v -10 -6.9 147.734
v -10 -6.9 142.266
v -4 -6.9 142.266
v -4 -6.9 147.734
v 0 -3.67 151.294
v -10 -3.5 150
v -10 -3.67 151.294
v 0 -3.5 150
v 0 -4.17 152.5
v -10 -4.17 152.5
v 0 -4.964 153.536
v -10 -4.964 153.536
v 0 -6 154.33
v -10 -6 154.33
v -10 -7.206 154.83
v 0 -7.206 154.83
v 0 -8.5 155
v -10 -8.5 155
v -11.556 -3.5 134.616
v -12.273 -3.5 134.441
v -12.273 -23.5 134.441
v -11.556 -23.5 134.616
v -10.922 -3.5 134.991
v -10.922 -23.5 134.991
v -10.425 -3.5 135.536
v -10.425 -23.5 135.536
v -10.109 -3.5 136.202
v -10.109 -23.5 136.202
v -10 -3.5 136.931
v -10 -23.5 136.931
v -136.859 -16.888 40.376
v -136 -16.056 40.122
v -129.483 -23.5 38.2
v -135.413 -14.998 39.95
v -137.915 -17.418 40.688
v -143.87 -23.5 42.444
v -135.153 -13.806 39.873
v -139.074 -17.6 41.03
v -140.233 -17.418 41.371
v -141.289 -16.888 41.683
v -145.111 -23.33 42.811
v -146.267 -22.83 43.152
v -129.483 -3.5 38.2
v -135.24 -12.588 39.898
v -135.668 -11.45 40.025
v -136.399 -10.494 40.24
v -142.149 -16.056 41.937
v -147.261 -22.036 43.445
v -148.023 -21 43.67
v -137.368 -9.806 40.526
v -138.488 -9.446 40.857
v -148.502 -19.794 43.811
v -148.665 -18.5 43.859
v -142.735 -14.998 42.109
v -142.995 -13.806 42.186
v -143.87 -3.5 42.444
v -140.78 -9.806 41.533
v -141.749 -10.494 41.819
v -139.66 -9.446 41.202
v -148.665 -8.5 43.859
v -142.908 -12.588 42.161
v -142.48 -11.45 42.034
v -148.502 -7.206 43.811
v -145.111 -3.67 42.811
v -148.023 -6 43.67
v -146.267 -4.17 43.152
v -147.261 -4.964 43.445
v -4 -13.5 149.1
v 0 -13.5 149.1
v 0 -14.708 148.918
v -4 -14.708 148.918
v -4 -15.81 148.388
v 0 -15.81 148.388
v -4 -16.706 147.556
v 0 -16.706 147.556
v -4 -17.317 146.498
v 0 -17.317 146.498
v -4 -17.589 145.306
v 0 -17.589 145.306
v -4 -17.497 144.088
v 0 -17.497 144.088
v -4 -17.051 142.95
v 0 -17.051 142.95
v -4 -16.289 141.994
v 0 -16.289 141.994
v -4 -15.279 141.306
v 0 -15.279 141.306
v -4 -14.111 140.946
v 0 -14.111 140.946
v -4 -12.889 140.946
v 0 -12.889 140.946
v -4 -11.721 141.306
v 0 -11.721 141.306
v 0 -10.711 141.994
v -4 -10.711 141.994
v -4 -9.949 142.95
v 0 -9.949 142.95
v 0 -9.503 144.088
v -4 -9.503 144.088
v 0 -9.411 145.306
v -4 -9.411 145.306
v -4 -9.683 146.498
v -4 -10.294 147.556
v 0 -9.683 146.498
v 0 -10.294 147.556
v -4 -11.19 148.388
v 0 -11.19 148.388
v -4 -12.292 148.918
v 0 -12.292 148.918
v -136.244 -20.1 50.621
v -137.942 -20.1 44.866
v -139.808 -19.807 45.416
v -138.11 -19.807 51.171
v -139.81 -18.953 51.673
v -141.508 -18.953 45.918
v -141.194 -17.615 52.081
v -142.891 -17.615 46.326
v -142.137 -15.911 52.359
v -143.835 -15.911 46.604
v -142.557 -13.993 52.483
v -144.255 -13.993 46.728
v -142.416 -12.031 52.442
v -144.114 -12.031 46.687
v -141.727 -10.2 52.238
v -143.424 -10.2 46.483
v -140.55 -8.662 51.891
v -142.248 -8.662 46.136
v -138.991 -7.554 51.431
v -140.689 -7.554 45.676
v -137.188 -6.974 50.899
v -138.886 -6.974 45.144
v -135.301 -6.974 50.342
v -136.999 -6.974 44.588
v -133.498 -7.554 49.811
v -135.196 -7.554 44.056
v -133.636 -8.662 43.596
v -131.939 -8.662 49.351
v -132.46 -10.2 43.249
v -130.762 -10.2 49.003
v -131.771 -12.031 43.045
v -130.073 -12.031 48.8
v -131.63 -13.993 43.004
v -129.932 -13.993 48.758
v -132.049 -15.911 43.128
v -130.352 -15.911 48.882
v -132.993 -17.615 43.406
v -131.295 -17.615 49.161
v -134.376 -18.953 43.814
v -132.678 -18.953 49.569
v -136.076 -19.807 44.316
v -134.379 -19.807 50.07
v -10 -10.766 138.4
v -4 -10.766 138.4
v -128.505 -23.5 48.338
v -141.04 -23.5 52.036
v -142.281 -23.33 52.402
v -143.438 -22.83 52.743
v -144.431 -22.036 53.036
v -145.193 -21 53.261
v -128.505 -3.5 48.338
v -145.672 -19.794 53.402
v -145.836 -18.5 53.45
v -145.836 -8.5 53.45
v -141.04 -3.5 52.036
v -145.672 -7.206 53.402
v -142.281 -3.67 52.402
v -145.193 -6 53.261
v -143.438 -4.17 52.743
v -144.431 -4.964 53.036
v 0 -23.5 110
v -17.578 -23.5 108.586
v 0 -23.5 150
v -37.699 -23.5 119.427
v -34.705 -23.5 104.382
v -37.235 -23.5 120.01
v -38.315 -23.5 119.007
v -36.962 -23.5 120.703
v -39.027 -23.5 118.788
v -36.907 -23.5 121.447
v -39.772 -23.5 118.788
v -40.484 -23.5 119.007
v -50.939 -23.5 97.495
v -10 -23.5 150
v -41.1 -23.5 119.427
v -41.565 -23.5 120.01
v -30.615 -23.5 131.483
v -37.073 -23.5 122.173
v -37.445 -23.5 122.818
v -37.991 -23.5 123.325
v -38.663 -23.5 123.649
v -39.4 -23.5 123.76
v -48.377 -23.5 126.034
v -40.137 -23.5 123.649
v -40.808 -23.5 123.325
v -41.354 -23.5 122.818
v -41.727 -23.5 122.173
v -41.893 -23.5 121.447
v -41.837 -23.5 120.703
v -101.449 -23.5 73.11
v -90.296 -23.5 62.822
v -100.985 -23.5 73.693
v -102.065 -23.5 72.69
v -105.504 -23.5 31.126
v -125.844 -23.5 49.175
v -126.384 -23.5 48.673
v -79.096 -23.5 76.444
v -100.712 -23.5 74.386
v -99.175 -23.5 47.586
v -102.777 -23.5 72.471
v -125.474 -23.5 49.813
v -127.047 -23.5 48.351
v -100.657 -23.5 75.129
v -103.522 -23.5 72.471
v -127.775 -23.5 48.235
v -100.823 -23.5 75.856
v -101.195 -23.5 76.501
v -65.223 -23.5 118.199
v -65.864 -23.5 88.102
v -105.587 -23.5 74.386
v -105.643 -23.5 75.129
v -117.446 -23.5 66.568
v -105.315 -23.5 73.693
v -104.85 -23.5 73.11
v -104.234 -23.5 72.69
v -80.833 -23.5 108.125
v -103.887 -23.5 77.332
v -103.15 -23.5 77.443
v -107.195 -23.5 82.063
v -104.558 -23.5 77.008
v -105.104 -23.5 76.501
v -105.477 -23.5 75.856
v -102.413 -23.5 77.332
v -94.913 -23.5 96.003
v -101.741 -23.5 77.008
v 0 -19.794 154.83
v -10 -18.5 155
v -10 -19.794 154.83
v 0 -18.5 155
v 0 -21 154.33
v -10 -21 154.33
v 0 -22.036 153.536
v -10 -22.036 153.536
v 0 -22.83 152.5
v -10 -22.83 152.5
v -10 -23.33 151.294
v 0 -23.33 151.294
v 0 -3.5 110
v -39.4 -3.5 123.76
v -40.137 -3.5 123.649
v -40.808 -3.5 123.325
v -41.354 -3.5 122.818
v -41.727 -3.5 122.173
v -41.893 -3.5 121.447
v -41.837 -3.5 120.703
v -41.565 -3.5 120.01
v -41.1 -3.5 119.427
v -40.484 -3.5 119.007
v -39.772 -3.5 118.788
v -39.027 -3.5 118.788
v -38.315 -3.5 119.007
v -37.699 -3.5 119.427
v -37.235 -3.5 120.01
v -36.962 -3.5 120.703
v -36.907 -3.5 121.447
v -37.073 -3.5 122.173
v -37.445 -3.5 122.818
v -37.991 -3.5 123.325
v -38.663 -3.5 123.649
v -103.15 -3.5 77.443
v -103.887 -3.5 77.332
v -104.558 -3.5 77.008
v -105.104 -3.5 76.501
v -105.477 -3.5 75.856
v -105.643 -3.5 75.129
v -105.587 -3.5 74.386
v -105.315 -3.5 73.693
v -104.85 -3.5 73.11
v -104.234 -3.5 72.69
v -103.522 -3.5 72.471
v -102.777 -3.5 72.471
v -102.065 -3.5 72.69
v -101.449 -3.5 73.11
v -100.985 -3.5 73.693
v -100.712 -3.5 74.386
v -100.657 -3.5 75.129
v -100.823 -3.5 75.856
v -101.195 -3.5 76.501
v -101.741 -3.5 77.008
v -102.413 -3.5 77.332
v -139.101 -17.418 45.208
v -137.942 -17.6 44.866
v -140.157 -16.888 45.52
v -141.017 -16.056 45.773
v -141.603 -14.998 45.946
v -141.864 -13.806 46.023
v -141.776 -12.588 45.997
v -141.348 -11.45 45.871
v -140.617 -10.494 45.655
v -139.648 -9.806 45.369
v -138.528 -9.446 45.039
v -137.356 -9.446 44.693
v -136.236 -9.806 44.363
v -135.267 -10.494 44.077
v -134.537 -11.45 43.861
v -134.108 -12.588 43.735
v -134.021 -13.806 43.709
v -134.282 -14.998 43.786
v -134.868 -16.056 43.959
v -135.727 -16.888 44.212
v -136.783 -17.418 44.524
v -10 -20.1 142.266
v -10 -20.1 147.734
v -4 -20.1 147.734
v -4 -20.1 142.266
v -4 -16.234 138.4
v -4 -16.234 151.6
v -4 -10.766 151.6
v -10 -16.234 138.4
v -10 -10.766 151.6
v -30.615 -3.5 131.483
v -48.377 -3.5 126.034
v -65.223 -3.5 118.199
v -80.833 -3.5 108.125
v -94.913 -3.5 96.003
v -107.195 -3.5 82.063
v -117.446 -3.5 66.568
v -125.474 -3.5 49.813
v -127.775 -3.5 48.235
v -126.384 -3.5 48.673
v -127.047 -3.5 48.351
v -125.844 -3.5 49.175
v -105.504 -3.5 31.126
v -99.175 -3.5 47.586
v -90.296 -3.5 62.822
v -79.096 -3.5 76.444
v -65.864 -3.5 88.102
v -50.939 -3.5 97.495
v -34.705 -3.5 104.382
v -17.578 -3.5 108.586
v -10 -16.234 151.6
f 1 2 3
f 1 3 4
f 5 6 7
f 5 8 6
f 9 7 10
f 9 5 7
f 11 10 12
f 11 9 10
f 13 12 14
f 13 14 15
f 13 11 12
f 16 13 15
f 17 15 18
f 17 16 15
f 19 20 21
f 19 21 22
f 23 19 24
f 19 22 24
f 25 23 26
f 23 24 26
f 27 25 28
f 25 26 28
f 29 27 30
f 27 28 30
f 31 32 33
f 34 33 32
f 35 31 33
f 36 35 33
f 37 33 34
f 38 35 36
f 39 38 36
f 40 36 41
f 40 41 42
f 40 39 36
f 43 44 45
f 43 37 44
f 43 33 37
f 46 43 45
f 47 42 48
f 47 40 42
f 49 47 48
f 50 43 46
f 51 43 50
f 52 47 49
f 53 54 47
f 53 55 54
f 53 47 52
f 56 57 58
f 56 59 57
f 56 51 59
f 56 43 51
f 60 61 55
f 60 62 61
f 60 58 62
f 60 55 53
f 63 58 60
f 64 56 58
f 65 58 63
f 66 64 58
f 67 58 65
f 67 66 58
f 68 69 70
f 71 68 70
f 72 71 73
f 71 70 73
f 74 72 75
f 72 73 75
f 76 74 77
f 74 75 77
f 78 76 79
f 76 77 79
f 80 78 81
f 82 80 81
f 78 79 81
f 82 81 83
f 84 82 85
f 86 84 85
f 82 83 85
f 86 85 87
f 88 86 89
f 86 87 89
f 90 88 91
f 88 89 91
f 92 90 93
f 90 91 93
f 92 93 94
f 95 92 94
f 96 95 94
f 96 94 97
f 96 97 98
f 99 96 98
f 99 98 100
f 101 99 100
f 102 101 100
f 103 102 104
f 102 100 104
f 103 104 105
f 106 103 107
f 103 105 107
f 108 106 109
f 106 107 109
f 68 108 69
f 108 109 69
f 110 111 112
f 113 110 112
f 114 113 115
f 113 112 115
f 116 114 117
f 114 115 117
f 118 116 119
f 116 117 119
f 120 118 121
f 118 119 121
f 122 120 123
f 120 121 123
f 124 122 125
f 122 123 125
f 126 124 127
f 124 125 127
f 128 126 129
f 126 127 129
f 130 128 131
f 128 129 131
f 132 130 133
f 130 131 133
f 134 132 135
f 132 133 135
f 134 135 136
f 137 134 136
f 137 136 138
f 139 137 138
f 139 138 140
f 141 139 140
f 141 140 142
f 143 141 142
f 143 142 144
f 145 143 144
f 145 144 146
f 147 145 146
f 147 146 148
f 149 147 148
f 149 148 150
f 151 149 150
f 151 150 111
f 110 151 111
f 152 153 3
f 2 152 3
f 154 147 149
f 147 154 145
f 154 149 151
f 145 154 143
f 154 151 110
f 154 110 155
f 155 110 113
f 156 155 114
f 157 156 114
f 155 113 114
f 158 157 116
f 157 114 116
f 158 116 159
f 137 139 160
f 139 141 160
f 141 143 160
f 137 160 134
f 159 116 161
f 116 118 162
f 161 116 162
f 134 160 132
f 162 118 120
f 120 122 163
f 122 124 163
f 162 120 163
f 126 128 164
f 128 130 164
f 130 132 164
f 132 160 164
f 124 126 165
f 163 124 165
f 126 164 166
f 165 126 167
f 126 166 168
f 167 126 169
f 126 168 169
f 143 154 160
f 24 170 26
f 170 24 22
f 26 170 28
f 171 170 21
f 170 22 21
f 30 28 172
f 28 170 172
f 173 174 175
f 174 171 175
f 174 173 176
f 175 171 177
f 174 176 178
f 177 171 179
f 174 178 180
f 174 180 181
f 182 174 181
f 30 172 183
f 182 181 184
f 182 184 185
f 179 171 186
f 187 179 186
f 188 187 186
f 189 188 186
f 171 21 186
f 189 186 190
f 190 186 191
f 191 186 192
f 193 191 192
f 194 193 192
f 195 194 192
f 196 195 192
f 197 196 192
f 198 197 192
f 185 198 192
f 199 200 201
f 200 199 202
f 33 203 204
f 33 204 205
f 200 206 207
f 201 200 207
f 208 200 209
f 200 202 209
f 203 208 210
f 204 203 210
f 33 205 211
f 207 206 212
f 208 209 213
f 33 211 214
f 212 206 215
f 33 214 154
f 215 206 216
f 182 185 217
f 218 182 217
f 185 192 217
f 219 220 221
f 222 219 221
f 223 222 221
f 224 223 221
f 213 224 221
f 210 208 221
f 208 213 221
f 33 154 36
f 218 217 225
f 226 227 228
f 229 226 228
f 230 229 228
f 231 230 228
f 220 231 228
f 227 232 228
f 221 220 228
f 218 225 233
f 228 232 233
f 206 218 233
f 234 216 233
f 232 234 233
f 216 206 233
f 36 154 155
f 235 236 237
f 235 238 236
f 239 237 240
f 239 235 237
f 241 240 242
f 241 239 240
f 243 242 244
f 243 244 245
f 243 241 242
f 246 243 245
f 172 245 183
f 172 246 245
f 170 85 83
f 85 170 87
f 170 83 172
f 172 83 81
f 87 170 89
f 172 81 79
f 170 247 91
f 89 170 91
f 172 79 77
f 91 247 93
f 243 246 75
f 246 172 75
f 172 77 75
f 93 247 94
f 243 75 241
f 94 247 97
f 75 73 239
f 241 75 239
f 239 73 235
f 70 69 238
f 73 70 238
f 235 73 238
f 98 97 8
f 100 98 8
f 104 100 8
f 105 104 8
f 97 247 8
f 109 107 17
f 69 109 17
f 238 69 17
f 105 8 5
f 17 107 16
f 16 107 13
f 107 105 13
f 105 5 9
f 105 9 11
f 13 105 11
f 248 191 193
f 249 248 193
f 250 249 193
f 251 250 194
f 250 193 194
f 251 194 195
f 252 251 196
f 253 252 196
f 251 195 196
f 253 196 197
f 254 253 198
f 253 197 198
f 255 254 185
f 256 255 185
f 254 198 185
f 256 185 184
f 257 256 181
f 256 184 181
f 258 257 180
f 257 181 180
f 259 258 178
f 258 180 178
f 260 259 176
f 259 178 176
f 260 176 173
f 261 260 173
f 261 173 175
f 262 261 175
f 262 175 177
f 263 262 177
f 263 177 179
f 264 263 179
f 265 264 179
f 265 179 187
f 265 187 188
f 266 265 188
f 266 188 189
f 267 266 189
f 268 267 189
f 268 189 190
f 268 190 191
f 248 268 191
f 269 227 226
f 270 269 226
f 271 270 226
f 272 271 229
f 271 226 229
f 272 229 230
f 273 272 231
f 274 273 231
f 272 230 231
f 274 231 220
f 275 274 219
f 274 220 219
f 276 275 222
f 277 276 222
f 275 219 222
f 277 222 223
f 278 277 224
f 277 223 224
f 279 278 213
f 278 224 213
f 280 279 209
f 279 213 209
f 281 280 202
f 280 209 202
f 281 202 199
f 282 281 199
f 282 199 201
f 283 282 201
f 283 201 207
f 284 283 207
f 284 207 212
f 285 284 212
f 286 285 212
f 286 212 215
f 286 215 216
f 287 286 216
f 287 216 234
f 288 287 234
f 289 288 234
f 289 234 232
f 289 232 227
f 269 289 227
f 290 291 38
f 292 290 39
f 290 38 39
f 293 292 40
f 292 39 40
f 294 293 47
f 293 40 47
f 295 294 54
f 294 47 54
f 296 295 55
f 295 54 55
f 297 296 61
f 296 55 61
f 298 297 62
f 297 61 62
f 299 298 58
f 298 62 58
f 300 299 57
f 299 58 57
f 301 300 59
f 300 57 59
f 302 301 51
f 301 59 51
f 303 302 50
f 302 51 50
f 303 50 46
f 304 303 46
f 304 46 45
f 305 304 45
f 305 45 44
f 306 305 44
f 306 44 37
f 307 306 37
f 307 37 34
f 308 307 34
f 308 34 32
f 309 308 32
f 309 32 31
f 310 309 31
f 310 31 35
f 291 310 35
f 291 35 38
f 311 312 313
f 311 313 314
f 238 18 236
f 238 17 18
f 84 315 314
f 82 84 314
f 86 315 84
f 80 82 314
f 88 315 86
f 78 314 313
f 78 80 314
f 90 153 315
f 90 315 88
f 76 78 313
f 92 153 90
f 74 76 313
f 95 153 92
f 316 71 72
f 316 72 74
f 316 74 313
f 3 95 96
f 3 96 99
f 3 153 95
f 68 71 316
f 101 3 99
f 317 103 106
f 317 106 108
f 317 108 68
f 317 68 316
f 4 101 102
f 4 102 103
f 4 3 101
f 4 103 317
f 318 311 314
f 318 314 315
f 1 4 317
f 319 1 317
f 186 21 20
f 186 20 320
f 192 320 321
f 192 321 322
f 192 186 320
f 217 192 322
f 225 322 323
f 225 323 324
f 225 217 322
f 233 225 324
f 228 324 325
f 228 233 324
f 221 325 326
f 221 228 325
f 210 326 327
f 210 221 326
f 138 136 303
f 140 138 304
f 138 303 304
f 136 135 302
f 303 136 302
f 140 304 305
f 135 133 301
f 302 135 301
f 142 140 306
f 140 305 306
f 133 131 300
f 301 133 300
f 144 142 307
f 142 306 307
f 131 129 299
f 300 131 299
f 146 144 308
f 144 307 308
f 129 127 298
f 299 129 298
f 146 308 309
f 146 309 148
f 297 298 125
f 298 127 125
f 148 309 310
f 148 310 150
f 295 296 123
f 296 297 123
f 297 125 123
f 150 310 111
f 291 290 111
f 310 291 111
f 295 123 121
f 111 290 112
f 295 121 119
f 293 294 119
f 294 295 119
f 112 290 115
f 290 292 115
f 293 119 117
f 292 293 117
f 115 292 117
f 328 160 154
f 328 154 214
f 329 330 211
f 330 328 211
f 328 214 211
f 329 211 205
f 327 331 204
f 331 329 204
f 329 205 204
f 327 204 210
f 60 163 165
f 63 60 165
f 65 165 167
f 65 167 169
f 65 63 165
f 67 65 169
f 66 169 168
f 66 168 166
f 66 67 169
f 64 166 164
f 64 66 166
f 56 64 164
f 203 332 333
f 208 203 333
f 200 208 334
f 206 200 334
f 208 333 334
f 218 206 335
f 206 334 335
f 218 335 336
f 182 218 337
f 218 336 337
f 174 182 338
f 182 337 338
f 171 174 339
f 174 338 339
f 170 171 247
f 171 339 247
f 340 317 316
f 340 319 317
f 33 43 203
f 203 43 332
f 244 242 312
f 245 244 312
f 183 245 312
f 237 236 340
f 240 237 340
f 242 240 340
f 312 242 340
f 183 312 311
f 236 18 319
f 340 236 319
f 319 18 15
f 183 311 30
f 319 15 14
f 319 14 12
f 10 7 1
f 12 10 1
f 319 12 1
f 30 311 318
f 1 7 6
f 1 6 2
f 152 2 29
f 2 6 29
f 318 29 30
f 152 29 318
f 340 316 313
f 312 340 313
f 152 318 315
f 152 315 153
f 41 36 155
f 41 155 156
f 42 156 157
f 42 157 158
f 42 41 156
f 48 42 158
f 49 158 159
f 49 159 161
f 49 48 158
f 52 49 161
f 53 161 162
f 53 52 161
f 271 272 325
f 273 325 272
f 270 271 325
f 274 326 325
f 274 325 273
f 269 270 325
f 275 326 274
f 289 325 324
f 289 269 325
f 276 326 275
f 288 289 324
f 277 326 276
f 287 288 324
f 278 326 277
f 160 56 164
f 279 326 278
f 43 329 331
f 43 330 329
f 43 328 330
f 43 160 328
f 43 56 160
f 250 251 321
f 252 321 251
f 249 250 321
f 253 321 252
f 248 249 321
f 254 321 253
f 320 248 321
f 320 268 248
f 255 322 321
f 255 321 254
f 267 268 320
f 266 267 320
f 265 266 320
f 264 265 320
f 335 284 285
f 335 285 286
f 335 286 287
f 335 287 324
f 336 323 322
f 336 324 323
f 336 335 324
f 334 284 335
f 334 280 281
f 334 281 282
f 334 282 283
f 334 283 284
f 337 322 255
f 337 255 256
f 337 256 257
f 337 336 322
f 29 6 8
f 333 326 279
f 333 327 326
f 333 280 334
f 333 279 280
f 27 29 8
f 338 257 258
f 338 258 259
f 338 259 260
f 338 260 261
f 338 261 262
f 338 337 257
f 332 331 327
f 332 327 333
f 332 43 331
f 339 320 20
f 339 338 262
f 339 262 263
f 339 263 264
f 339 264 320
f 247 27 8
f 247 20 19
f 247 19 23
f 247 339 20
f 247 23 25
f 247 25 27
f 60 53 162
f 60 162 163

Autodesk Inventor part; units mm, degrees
ref_plane "YZ Plane" through (0, 0, 0) normal (1, 0, 0) x (0, 1, 0)
ref_plane "XZ Plane" through (0, 0, 0) normal (0, 1, 0) x (-1, 0, 0)
ref_plane "XY Plane" through (0, 0, 0) normal (0, 0, 1) x (1, 0, 0)
sketch "Sketch1" plane through (0, 0, 0) normal (0, 1, 0) x (-1, 0, 0)
  circle A0 centre (0, 0) radius 135
  circle A1 centre (0, 0) radius 110
  dimension "d0" = 270
  dimension "d1" = 220
extrude "Extrusion1" add sketch "Sketch1" along normal mid plane 47
sketch "Sketch2" plane through (0, 0, 0) normal (0, 0, 1) x (1, 0, 0)
  circle A0 centre (0, -20.5) radius 18
  line L0 (-135, -23.5) -> (135, -23.5) projected
  dimension "d4" = 36
  dimension "d38" = 3
extrude "Extrusion2" cut sketch "Sketch2" against normal through all
sketch "Sketch3" plane through (0, 23.5, 0) normal (0, 1, 0) x (1, 0, 0)
  circle A0 centre (0, 0) radius 127.5
  circle A1 centre (-127.5, 0) radius 2
  circle A2 centre (-103.1497, -74.9426) radius 2
  circle A3 centre (-39.3997, -121.2597) radius 2
  circle A4 centre (39.3997, -121.2597) radius 2
  circle A5 centre (103.1497, -74.9426) radius 2
  circle A6 centre (127.5, 0) radius 2
  circle A7 centre (103.1497, 74.9426) radius 2
  circle A8 centre (39.3997, 121.2597) radius 2
  circle A9 centre (-39.3997, 121.2597) radius 2
  circle A10 centre (-103.1497, 74.9426) radius 2
  dimension "d7" = 255
  dimension "d8" = 4
  dimension "d11" = 360
hole "Hole1" at (39.3997, 23.5, 121.2597) at (-39.3997, 23.5, 121.2597) at (-103.1497, 23.5, 74.9426) at (-127.5, 23.5, 0) at (-103.1497, 23.5, -74.9426) at (-39.3997, 23.5, -121.2597) at (39.3997, 23.5, -121.2597) at (103.1497, 23.5, -74.9426) at (127.5, 23.5, 0) at (103.1497, 23.5, 74.9426) direction (0, -1, 0) diameter 5 end through all
sketch "Sketch4" plane through (0, 23.5, 0) normal (0, 1, 0) x (1, 0, 0)
  circle A0 centre (0, 0) radius 140
extrude "Extrusion3" cut sketch "Sketch4" against normal blind 27
sketch "Sketch7" plane through (0, -3.5, 0) normal (0, 1, 0) x (1, 0, 0)
  line L0 (0, 0) -> (70, 0)
  line L1 (80, -100) -> (60, -100)
  line L2 (60, -100) -> (60, 100)
  line L3 (60, 100) -> (80, 100)
  line L4 (80, 100) -> (80, -100)
  line L5 (80, -100) -> (60, 100) construction
  line L6 (60, -100) -> (80, 100) construction
  dimension "d39" = 70
  dimension "d40" = 20
  dimension "d41" = 200
extrude "Extrusion7" cut sketch "Sketch7" against normal blind 15
sketch "Sketch8" plane through (0, -3.5, 0) normal (0, 1, 0) x (1, 0, 0)
  line L0 (-129.4827, -38.1999) -> (129.4827, 38.1999)
  line L1 (0, 134.8703) -> (0, -135)
  arc A0 (-5.9161, 134.8703) -> (5.9161, 134.8703) centre (0, 0) ccw projected
  arc A1 (5.9161, 134.8703) -> (-5.9161, 134.8703) centre (0, 0) ccw
  point P0 (5.9161, 134.8703)
  point P1 (0, 0)
extrude "Extrusion8" cut sketch "Sketch8" against normal through all contours A0 A1 L0 | L0 A0 L1 picked at (87.5063, 20.3809)
sketch "Sketch9" plane through (-129.4827, -23.5, 38.1999) normal (-0.2829619, 0, -0.9591312) x (-0.9591312, 0, 0.2829619)
  line L0 (-96.8001, 0) -> (0, 0) projected
  line L1 (-2.5, 0) -> (15, 0)
  line L2 (20, 5) -> (20, 15)
  line L3 (15, 20) -> (-2.5, 20)
  line L4 (-2.5, 20) -> (-2.5, 0)
  line L5 (0, 20) -> (0, 0) projected
  arc A0 (20, 15) -> (15, 20) centre (15, 15) ccw
  arc A1 (15, 0) -> (20, 5) centre (15, 5) ccw
  point P0 (-135, 23.5)
  point P1 (20, 20)
  point P2 (20, 0)
  dimension "d46" = 22.5
  dimension "d47" = 20
  dimension "d48" = 20
  dimension "d49" = 5
extrude "Extrusion9" add sketch "Sketch9" against normal blind 10
fillet "Fillet1" radius 2.5 1 edges at (-126.2974, -13.5, 47.6862)
sketch "Sketch10" plane through (-126.6531, -23.5, 47.7912) normal (0.2829619, 0, 0.9591312) x (0.9591312, 0, -0.2829619)
  line L0 (-20, 15) -> (-20, 5) projected
  line L1 (-1.9306, 20) -> (-15, 20) projected
  point P0 (135, 23.5)
  point P1 (-10, 10)
  dimension "d53" = 10
  dimension "d54" = 10
hole "Hole2" at (-136.2444, -13.5, 50.6208) direction (-0.2829619, 0, -0.9591312) diameter 8.2 end through all counterbore diameter 13.2 counterbore depth 6
sketch "Sketch11" plane through (0, -3.5, 135) normal (1, 0, 0) x (0, 0, -1)
  line L0 (2.5, 0) -> (-15, 0)
  line L1 (-20, -5) -> (-20, -15)
  line L2 (-15, -20) -> (2.5, -20)
  line L3 (2.5, -20) -> (2.5, 0)
  line L4 (0, -20) -> (0, 0) projected
  arc A0 (-15, 0) -> (-20, -5) centre (-15, -5) ccw
  arc A1 (-20, -15) -> (-15, -20) centre (-15, -15) ccw
  point P0 (135, 3.5)
  point P1 (-20, -20)
  point P2 (-20, 0)
  dimension "d62" = 22.5
  dimension "d63" = 20
  dimension "d64" = 20
  dimension "d65" = 5
extrude "Extrusion10" add sketch "Sketch11" against normal blind 10
fillet "Fillet2" radius 2.5 1 edges at (-10, -13.5, 134.6291)
sketch "Sketch12" plane through (-10, -3.5, 135) normal (-1, 0, 0) x (0, 0, 1)
  line L0 (16.6, -12.7338) -> (12.7338, -16.6)
  line L1 (12.7338, -16.6) -> (7.2662, -16.6)
  line L2 (7.2662, -16.6) -> (3.4, -12.7338)
  line L3 (3.4, -12.7338) -> (3.4, -7.2662)
  line L4 (3.4, -7.2662) -> (7.2662, -3.4)
  line L5 (7.2662, -3.4) -> (12.7338, -3.4)
  line L6 (12.7338, -3.4) -> (16.6, -7.2662)
  line L7 (16.6, -7.2662) -> (16.6, -12.7338)
  line L8 (1.9306, -20) -> (15, -20) projected
  line L9 (20, -15) -> (20, -5) projected
  point P0 (-135, 3.5)
  point P1 (10, -10)
  dimension "d69" = 10
  dimension "d70" = 10
  dimension "d71" = 13.2
extrude "Extrusion11" cut sketch "Sketch12" against normal blind 6
sketch "Sketch13" plane through (-4, -3.5, 135) normal (-1, 0, 0) x (0, 0, 1)
  line L0 (20, -15) -> (20, -5) projected
  point P0 (-135, 3.5)
  point P1 (10, -10)
  dimension "d74" = 10
hole "Hole3" at (-4, -13.5, 145) direction (1, 0, 0) diameter 8.2 end through all
properties part number "Cylinder Spacer Bottom_Q4"
